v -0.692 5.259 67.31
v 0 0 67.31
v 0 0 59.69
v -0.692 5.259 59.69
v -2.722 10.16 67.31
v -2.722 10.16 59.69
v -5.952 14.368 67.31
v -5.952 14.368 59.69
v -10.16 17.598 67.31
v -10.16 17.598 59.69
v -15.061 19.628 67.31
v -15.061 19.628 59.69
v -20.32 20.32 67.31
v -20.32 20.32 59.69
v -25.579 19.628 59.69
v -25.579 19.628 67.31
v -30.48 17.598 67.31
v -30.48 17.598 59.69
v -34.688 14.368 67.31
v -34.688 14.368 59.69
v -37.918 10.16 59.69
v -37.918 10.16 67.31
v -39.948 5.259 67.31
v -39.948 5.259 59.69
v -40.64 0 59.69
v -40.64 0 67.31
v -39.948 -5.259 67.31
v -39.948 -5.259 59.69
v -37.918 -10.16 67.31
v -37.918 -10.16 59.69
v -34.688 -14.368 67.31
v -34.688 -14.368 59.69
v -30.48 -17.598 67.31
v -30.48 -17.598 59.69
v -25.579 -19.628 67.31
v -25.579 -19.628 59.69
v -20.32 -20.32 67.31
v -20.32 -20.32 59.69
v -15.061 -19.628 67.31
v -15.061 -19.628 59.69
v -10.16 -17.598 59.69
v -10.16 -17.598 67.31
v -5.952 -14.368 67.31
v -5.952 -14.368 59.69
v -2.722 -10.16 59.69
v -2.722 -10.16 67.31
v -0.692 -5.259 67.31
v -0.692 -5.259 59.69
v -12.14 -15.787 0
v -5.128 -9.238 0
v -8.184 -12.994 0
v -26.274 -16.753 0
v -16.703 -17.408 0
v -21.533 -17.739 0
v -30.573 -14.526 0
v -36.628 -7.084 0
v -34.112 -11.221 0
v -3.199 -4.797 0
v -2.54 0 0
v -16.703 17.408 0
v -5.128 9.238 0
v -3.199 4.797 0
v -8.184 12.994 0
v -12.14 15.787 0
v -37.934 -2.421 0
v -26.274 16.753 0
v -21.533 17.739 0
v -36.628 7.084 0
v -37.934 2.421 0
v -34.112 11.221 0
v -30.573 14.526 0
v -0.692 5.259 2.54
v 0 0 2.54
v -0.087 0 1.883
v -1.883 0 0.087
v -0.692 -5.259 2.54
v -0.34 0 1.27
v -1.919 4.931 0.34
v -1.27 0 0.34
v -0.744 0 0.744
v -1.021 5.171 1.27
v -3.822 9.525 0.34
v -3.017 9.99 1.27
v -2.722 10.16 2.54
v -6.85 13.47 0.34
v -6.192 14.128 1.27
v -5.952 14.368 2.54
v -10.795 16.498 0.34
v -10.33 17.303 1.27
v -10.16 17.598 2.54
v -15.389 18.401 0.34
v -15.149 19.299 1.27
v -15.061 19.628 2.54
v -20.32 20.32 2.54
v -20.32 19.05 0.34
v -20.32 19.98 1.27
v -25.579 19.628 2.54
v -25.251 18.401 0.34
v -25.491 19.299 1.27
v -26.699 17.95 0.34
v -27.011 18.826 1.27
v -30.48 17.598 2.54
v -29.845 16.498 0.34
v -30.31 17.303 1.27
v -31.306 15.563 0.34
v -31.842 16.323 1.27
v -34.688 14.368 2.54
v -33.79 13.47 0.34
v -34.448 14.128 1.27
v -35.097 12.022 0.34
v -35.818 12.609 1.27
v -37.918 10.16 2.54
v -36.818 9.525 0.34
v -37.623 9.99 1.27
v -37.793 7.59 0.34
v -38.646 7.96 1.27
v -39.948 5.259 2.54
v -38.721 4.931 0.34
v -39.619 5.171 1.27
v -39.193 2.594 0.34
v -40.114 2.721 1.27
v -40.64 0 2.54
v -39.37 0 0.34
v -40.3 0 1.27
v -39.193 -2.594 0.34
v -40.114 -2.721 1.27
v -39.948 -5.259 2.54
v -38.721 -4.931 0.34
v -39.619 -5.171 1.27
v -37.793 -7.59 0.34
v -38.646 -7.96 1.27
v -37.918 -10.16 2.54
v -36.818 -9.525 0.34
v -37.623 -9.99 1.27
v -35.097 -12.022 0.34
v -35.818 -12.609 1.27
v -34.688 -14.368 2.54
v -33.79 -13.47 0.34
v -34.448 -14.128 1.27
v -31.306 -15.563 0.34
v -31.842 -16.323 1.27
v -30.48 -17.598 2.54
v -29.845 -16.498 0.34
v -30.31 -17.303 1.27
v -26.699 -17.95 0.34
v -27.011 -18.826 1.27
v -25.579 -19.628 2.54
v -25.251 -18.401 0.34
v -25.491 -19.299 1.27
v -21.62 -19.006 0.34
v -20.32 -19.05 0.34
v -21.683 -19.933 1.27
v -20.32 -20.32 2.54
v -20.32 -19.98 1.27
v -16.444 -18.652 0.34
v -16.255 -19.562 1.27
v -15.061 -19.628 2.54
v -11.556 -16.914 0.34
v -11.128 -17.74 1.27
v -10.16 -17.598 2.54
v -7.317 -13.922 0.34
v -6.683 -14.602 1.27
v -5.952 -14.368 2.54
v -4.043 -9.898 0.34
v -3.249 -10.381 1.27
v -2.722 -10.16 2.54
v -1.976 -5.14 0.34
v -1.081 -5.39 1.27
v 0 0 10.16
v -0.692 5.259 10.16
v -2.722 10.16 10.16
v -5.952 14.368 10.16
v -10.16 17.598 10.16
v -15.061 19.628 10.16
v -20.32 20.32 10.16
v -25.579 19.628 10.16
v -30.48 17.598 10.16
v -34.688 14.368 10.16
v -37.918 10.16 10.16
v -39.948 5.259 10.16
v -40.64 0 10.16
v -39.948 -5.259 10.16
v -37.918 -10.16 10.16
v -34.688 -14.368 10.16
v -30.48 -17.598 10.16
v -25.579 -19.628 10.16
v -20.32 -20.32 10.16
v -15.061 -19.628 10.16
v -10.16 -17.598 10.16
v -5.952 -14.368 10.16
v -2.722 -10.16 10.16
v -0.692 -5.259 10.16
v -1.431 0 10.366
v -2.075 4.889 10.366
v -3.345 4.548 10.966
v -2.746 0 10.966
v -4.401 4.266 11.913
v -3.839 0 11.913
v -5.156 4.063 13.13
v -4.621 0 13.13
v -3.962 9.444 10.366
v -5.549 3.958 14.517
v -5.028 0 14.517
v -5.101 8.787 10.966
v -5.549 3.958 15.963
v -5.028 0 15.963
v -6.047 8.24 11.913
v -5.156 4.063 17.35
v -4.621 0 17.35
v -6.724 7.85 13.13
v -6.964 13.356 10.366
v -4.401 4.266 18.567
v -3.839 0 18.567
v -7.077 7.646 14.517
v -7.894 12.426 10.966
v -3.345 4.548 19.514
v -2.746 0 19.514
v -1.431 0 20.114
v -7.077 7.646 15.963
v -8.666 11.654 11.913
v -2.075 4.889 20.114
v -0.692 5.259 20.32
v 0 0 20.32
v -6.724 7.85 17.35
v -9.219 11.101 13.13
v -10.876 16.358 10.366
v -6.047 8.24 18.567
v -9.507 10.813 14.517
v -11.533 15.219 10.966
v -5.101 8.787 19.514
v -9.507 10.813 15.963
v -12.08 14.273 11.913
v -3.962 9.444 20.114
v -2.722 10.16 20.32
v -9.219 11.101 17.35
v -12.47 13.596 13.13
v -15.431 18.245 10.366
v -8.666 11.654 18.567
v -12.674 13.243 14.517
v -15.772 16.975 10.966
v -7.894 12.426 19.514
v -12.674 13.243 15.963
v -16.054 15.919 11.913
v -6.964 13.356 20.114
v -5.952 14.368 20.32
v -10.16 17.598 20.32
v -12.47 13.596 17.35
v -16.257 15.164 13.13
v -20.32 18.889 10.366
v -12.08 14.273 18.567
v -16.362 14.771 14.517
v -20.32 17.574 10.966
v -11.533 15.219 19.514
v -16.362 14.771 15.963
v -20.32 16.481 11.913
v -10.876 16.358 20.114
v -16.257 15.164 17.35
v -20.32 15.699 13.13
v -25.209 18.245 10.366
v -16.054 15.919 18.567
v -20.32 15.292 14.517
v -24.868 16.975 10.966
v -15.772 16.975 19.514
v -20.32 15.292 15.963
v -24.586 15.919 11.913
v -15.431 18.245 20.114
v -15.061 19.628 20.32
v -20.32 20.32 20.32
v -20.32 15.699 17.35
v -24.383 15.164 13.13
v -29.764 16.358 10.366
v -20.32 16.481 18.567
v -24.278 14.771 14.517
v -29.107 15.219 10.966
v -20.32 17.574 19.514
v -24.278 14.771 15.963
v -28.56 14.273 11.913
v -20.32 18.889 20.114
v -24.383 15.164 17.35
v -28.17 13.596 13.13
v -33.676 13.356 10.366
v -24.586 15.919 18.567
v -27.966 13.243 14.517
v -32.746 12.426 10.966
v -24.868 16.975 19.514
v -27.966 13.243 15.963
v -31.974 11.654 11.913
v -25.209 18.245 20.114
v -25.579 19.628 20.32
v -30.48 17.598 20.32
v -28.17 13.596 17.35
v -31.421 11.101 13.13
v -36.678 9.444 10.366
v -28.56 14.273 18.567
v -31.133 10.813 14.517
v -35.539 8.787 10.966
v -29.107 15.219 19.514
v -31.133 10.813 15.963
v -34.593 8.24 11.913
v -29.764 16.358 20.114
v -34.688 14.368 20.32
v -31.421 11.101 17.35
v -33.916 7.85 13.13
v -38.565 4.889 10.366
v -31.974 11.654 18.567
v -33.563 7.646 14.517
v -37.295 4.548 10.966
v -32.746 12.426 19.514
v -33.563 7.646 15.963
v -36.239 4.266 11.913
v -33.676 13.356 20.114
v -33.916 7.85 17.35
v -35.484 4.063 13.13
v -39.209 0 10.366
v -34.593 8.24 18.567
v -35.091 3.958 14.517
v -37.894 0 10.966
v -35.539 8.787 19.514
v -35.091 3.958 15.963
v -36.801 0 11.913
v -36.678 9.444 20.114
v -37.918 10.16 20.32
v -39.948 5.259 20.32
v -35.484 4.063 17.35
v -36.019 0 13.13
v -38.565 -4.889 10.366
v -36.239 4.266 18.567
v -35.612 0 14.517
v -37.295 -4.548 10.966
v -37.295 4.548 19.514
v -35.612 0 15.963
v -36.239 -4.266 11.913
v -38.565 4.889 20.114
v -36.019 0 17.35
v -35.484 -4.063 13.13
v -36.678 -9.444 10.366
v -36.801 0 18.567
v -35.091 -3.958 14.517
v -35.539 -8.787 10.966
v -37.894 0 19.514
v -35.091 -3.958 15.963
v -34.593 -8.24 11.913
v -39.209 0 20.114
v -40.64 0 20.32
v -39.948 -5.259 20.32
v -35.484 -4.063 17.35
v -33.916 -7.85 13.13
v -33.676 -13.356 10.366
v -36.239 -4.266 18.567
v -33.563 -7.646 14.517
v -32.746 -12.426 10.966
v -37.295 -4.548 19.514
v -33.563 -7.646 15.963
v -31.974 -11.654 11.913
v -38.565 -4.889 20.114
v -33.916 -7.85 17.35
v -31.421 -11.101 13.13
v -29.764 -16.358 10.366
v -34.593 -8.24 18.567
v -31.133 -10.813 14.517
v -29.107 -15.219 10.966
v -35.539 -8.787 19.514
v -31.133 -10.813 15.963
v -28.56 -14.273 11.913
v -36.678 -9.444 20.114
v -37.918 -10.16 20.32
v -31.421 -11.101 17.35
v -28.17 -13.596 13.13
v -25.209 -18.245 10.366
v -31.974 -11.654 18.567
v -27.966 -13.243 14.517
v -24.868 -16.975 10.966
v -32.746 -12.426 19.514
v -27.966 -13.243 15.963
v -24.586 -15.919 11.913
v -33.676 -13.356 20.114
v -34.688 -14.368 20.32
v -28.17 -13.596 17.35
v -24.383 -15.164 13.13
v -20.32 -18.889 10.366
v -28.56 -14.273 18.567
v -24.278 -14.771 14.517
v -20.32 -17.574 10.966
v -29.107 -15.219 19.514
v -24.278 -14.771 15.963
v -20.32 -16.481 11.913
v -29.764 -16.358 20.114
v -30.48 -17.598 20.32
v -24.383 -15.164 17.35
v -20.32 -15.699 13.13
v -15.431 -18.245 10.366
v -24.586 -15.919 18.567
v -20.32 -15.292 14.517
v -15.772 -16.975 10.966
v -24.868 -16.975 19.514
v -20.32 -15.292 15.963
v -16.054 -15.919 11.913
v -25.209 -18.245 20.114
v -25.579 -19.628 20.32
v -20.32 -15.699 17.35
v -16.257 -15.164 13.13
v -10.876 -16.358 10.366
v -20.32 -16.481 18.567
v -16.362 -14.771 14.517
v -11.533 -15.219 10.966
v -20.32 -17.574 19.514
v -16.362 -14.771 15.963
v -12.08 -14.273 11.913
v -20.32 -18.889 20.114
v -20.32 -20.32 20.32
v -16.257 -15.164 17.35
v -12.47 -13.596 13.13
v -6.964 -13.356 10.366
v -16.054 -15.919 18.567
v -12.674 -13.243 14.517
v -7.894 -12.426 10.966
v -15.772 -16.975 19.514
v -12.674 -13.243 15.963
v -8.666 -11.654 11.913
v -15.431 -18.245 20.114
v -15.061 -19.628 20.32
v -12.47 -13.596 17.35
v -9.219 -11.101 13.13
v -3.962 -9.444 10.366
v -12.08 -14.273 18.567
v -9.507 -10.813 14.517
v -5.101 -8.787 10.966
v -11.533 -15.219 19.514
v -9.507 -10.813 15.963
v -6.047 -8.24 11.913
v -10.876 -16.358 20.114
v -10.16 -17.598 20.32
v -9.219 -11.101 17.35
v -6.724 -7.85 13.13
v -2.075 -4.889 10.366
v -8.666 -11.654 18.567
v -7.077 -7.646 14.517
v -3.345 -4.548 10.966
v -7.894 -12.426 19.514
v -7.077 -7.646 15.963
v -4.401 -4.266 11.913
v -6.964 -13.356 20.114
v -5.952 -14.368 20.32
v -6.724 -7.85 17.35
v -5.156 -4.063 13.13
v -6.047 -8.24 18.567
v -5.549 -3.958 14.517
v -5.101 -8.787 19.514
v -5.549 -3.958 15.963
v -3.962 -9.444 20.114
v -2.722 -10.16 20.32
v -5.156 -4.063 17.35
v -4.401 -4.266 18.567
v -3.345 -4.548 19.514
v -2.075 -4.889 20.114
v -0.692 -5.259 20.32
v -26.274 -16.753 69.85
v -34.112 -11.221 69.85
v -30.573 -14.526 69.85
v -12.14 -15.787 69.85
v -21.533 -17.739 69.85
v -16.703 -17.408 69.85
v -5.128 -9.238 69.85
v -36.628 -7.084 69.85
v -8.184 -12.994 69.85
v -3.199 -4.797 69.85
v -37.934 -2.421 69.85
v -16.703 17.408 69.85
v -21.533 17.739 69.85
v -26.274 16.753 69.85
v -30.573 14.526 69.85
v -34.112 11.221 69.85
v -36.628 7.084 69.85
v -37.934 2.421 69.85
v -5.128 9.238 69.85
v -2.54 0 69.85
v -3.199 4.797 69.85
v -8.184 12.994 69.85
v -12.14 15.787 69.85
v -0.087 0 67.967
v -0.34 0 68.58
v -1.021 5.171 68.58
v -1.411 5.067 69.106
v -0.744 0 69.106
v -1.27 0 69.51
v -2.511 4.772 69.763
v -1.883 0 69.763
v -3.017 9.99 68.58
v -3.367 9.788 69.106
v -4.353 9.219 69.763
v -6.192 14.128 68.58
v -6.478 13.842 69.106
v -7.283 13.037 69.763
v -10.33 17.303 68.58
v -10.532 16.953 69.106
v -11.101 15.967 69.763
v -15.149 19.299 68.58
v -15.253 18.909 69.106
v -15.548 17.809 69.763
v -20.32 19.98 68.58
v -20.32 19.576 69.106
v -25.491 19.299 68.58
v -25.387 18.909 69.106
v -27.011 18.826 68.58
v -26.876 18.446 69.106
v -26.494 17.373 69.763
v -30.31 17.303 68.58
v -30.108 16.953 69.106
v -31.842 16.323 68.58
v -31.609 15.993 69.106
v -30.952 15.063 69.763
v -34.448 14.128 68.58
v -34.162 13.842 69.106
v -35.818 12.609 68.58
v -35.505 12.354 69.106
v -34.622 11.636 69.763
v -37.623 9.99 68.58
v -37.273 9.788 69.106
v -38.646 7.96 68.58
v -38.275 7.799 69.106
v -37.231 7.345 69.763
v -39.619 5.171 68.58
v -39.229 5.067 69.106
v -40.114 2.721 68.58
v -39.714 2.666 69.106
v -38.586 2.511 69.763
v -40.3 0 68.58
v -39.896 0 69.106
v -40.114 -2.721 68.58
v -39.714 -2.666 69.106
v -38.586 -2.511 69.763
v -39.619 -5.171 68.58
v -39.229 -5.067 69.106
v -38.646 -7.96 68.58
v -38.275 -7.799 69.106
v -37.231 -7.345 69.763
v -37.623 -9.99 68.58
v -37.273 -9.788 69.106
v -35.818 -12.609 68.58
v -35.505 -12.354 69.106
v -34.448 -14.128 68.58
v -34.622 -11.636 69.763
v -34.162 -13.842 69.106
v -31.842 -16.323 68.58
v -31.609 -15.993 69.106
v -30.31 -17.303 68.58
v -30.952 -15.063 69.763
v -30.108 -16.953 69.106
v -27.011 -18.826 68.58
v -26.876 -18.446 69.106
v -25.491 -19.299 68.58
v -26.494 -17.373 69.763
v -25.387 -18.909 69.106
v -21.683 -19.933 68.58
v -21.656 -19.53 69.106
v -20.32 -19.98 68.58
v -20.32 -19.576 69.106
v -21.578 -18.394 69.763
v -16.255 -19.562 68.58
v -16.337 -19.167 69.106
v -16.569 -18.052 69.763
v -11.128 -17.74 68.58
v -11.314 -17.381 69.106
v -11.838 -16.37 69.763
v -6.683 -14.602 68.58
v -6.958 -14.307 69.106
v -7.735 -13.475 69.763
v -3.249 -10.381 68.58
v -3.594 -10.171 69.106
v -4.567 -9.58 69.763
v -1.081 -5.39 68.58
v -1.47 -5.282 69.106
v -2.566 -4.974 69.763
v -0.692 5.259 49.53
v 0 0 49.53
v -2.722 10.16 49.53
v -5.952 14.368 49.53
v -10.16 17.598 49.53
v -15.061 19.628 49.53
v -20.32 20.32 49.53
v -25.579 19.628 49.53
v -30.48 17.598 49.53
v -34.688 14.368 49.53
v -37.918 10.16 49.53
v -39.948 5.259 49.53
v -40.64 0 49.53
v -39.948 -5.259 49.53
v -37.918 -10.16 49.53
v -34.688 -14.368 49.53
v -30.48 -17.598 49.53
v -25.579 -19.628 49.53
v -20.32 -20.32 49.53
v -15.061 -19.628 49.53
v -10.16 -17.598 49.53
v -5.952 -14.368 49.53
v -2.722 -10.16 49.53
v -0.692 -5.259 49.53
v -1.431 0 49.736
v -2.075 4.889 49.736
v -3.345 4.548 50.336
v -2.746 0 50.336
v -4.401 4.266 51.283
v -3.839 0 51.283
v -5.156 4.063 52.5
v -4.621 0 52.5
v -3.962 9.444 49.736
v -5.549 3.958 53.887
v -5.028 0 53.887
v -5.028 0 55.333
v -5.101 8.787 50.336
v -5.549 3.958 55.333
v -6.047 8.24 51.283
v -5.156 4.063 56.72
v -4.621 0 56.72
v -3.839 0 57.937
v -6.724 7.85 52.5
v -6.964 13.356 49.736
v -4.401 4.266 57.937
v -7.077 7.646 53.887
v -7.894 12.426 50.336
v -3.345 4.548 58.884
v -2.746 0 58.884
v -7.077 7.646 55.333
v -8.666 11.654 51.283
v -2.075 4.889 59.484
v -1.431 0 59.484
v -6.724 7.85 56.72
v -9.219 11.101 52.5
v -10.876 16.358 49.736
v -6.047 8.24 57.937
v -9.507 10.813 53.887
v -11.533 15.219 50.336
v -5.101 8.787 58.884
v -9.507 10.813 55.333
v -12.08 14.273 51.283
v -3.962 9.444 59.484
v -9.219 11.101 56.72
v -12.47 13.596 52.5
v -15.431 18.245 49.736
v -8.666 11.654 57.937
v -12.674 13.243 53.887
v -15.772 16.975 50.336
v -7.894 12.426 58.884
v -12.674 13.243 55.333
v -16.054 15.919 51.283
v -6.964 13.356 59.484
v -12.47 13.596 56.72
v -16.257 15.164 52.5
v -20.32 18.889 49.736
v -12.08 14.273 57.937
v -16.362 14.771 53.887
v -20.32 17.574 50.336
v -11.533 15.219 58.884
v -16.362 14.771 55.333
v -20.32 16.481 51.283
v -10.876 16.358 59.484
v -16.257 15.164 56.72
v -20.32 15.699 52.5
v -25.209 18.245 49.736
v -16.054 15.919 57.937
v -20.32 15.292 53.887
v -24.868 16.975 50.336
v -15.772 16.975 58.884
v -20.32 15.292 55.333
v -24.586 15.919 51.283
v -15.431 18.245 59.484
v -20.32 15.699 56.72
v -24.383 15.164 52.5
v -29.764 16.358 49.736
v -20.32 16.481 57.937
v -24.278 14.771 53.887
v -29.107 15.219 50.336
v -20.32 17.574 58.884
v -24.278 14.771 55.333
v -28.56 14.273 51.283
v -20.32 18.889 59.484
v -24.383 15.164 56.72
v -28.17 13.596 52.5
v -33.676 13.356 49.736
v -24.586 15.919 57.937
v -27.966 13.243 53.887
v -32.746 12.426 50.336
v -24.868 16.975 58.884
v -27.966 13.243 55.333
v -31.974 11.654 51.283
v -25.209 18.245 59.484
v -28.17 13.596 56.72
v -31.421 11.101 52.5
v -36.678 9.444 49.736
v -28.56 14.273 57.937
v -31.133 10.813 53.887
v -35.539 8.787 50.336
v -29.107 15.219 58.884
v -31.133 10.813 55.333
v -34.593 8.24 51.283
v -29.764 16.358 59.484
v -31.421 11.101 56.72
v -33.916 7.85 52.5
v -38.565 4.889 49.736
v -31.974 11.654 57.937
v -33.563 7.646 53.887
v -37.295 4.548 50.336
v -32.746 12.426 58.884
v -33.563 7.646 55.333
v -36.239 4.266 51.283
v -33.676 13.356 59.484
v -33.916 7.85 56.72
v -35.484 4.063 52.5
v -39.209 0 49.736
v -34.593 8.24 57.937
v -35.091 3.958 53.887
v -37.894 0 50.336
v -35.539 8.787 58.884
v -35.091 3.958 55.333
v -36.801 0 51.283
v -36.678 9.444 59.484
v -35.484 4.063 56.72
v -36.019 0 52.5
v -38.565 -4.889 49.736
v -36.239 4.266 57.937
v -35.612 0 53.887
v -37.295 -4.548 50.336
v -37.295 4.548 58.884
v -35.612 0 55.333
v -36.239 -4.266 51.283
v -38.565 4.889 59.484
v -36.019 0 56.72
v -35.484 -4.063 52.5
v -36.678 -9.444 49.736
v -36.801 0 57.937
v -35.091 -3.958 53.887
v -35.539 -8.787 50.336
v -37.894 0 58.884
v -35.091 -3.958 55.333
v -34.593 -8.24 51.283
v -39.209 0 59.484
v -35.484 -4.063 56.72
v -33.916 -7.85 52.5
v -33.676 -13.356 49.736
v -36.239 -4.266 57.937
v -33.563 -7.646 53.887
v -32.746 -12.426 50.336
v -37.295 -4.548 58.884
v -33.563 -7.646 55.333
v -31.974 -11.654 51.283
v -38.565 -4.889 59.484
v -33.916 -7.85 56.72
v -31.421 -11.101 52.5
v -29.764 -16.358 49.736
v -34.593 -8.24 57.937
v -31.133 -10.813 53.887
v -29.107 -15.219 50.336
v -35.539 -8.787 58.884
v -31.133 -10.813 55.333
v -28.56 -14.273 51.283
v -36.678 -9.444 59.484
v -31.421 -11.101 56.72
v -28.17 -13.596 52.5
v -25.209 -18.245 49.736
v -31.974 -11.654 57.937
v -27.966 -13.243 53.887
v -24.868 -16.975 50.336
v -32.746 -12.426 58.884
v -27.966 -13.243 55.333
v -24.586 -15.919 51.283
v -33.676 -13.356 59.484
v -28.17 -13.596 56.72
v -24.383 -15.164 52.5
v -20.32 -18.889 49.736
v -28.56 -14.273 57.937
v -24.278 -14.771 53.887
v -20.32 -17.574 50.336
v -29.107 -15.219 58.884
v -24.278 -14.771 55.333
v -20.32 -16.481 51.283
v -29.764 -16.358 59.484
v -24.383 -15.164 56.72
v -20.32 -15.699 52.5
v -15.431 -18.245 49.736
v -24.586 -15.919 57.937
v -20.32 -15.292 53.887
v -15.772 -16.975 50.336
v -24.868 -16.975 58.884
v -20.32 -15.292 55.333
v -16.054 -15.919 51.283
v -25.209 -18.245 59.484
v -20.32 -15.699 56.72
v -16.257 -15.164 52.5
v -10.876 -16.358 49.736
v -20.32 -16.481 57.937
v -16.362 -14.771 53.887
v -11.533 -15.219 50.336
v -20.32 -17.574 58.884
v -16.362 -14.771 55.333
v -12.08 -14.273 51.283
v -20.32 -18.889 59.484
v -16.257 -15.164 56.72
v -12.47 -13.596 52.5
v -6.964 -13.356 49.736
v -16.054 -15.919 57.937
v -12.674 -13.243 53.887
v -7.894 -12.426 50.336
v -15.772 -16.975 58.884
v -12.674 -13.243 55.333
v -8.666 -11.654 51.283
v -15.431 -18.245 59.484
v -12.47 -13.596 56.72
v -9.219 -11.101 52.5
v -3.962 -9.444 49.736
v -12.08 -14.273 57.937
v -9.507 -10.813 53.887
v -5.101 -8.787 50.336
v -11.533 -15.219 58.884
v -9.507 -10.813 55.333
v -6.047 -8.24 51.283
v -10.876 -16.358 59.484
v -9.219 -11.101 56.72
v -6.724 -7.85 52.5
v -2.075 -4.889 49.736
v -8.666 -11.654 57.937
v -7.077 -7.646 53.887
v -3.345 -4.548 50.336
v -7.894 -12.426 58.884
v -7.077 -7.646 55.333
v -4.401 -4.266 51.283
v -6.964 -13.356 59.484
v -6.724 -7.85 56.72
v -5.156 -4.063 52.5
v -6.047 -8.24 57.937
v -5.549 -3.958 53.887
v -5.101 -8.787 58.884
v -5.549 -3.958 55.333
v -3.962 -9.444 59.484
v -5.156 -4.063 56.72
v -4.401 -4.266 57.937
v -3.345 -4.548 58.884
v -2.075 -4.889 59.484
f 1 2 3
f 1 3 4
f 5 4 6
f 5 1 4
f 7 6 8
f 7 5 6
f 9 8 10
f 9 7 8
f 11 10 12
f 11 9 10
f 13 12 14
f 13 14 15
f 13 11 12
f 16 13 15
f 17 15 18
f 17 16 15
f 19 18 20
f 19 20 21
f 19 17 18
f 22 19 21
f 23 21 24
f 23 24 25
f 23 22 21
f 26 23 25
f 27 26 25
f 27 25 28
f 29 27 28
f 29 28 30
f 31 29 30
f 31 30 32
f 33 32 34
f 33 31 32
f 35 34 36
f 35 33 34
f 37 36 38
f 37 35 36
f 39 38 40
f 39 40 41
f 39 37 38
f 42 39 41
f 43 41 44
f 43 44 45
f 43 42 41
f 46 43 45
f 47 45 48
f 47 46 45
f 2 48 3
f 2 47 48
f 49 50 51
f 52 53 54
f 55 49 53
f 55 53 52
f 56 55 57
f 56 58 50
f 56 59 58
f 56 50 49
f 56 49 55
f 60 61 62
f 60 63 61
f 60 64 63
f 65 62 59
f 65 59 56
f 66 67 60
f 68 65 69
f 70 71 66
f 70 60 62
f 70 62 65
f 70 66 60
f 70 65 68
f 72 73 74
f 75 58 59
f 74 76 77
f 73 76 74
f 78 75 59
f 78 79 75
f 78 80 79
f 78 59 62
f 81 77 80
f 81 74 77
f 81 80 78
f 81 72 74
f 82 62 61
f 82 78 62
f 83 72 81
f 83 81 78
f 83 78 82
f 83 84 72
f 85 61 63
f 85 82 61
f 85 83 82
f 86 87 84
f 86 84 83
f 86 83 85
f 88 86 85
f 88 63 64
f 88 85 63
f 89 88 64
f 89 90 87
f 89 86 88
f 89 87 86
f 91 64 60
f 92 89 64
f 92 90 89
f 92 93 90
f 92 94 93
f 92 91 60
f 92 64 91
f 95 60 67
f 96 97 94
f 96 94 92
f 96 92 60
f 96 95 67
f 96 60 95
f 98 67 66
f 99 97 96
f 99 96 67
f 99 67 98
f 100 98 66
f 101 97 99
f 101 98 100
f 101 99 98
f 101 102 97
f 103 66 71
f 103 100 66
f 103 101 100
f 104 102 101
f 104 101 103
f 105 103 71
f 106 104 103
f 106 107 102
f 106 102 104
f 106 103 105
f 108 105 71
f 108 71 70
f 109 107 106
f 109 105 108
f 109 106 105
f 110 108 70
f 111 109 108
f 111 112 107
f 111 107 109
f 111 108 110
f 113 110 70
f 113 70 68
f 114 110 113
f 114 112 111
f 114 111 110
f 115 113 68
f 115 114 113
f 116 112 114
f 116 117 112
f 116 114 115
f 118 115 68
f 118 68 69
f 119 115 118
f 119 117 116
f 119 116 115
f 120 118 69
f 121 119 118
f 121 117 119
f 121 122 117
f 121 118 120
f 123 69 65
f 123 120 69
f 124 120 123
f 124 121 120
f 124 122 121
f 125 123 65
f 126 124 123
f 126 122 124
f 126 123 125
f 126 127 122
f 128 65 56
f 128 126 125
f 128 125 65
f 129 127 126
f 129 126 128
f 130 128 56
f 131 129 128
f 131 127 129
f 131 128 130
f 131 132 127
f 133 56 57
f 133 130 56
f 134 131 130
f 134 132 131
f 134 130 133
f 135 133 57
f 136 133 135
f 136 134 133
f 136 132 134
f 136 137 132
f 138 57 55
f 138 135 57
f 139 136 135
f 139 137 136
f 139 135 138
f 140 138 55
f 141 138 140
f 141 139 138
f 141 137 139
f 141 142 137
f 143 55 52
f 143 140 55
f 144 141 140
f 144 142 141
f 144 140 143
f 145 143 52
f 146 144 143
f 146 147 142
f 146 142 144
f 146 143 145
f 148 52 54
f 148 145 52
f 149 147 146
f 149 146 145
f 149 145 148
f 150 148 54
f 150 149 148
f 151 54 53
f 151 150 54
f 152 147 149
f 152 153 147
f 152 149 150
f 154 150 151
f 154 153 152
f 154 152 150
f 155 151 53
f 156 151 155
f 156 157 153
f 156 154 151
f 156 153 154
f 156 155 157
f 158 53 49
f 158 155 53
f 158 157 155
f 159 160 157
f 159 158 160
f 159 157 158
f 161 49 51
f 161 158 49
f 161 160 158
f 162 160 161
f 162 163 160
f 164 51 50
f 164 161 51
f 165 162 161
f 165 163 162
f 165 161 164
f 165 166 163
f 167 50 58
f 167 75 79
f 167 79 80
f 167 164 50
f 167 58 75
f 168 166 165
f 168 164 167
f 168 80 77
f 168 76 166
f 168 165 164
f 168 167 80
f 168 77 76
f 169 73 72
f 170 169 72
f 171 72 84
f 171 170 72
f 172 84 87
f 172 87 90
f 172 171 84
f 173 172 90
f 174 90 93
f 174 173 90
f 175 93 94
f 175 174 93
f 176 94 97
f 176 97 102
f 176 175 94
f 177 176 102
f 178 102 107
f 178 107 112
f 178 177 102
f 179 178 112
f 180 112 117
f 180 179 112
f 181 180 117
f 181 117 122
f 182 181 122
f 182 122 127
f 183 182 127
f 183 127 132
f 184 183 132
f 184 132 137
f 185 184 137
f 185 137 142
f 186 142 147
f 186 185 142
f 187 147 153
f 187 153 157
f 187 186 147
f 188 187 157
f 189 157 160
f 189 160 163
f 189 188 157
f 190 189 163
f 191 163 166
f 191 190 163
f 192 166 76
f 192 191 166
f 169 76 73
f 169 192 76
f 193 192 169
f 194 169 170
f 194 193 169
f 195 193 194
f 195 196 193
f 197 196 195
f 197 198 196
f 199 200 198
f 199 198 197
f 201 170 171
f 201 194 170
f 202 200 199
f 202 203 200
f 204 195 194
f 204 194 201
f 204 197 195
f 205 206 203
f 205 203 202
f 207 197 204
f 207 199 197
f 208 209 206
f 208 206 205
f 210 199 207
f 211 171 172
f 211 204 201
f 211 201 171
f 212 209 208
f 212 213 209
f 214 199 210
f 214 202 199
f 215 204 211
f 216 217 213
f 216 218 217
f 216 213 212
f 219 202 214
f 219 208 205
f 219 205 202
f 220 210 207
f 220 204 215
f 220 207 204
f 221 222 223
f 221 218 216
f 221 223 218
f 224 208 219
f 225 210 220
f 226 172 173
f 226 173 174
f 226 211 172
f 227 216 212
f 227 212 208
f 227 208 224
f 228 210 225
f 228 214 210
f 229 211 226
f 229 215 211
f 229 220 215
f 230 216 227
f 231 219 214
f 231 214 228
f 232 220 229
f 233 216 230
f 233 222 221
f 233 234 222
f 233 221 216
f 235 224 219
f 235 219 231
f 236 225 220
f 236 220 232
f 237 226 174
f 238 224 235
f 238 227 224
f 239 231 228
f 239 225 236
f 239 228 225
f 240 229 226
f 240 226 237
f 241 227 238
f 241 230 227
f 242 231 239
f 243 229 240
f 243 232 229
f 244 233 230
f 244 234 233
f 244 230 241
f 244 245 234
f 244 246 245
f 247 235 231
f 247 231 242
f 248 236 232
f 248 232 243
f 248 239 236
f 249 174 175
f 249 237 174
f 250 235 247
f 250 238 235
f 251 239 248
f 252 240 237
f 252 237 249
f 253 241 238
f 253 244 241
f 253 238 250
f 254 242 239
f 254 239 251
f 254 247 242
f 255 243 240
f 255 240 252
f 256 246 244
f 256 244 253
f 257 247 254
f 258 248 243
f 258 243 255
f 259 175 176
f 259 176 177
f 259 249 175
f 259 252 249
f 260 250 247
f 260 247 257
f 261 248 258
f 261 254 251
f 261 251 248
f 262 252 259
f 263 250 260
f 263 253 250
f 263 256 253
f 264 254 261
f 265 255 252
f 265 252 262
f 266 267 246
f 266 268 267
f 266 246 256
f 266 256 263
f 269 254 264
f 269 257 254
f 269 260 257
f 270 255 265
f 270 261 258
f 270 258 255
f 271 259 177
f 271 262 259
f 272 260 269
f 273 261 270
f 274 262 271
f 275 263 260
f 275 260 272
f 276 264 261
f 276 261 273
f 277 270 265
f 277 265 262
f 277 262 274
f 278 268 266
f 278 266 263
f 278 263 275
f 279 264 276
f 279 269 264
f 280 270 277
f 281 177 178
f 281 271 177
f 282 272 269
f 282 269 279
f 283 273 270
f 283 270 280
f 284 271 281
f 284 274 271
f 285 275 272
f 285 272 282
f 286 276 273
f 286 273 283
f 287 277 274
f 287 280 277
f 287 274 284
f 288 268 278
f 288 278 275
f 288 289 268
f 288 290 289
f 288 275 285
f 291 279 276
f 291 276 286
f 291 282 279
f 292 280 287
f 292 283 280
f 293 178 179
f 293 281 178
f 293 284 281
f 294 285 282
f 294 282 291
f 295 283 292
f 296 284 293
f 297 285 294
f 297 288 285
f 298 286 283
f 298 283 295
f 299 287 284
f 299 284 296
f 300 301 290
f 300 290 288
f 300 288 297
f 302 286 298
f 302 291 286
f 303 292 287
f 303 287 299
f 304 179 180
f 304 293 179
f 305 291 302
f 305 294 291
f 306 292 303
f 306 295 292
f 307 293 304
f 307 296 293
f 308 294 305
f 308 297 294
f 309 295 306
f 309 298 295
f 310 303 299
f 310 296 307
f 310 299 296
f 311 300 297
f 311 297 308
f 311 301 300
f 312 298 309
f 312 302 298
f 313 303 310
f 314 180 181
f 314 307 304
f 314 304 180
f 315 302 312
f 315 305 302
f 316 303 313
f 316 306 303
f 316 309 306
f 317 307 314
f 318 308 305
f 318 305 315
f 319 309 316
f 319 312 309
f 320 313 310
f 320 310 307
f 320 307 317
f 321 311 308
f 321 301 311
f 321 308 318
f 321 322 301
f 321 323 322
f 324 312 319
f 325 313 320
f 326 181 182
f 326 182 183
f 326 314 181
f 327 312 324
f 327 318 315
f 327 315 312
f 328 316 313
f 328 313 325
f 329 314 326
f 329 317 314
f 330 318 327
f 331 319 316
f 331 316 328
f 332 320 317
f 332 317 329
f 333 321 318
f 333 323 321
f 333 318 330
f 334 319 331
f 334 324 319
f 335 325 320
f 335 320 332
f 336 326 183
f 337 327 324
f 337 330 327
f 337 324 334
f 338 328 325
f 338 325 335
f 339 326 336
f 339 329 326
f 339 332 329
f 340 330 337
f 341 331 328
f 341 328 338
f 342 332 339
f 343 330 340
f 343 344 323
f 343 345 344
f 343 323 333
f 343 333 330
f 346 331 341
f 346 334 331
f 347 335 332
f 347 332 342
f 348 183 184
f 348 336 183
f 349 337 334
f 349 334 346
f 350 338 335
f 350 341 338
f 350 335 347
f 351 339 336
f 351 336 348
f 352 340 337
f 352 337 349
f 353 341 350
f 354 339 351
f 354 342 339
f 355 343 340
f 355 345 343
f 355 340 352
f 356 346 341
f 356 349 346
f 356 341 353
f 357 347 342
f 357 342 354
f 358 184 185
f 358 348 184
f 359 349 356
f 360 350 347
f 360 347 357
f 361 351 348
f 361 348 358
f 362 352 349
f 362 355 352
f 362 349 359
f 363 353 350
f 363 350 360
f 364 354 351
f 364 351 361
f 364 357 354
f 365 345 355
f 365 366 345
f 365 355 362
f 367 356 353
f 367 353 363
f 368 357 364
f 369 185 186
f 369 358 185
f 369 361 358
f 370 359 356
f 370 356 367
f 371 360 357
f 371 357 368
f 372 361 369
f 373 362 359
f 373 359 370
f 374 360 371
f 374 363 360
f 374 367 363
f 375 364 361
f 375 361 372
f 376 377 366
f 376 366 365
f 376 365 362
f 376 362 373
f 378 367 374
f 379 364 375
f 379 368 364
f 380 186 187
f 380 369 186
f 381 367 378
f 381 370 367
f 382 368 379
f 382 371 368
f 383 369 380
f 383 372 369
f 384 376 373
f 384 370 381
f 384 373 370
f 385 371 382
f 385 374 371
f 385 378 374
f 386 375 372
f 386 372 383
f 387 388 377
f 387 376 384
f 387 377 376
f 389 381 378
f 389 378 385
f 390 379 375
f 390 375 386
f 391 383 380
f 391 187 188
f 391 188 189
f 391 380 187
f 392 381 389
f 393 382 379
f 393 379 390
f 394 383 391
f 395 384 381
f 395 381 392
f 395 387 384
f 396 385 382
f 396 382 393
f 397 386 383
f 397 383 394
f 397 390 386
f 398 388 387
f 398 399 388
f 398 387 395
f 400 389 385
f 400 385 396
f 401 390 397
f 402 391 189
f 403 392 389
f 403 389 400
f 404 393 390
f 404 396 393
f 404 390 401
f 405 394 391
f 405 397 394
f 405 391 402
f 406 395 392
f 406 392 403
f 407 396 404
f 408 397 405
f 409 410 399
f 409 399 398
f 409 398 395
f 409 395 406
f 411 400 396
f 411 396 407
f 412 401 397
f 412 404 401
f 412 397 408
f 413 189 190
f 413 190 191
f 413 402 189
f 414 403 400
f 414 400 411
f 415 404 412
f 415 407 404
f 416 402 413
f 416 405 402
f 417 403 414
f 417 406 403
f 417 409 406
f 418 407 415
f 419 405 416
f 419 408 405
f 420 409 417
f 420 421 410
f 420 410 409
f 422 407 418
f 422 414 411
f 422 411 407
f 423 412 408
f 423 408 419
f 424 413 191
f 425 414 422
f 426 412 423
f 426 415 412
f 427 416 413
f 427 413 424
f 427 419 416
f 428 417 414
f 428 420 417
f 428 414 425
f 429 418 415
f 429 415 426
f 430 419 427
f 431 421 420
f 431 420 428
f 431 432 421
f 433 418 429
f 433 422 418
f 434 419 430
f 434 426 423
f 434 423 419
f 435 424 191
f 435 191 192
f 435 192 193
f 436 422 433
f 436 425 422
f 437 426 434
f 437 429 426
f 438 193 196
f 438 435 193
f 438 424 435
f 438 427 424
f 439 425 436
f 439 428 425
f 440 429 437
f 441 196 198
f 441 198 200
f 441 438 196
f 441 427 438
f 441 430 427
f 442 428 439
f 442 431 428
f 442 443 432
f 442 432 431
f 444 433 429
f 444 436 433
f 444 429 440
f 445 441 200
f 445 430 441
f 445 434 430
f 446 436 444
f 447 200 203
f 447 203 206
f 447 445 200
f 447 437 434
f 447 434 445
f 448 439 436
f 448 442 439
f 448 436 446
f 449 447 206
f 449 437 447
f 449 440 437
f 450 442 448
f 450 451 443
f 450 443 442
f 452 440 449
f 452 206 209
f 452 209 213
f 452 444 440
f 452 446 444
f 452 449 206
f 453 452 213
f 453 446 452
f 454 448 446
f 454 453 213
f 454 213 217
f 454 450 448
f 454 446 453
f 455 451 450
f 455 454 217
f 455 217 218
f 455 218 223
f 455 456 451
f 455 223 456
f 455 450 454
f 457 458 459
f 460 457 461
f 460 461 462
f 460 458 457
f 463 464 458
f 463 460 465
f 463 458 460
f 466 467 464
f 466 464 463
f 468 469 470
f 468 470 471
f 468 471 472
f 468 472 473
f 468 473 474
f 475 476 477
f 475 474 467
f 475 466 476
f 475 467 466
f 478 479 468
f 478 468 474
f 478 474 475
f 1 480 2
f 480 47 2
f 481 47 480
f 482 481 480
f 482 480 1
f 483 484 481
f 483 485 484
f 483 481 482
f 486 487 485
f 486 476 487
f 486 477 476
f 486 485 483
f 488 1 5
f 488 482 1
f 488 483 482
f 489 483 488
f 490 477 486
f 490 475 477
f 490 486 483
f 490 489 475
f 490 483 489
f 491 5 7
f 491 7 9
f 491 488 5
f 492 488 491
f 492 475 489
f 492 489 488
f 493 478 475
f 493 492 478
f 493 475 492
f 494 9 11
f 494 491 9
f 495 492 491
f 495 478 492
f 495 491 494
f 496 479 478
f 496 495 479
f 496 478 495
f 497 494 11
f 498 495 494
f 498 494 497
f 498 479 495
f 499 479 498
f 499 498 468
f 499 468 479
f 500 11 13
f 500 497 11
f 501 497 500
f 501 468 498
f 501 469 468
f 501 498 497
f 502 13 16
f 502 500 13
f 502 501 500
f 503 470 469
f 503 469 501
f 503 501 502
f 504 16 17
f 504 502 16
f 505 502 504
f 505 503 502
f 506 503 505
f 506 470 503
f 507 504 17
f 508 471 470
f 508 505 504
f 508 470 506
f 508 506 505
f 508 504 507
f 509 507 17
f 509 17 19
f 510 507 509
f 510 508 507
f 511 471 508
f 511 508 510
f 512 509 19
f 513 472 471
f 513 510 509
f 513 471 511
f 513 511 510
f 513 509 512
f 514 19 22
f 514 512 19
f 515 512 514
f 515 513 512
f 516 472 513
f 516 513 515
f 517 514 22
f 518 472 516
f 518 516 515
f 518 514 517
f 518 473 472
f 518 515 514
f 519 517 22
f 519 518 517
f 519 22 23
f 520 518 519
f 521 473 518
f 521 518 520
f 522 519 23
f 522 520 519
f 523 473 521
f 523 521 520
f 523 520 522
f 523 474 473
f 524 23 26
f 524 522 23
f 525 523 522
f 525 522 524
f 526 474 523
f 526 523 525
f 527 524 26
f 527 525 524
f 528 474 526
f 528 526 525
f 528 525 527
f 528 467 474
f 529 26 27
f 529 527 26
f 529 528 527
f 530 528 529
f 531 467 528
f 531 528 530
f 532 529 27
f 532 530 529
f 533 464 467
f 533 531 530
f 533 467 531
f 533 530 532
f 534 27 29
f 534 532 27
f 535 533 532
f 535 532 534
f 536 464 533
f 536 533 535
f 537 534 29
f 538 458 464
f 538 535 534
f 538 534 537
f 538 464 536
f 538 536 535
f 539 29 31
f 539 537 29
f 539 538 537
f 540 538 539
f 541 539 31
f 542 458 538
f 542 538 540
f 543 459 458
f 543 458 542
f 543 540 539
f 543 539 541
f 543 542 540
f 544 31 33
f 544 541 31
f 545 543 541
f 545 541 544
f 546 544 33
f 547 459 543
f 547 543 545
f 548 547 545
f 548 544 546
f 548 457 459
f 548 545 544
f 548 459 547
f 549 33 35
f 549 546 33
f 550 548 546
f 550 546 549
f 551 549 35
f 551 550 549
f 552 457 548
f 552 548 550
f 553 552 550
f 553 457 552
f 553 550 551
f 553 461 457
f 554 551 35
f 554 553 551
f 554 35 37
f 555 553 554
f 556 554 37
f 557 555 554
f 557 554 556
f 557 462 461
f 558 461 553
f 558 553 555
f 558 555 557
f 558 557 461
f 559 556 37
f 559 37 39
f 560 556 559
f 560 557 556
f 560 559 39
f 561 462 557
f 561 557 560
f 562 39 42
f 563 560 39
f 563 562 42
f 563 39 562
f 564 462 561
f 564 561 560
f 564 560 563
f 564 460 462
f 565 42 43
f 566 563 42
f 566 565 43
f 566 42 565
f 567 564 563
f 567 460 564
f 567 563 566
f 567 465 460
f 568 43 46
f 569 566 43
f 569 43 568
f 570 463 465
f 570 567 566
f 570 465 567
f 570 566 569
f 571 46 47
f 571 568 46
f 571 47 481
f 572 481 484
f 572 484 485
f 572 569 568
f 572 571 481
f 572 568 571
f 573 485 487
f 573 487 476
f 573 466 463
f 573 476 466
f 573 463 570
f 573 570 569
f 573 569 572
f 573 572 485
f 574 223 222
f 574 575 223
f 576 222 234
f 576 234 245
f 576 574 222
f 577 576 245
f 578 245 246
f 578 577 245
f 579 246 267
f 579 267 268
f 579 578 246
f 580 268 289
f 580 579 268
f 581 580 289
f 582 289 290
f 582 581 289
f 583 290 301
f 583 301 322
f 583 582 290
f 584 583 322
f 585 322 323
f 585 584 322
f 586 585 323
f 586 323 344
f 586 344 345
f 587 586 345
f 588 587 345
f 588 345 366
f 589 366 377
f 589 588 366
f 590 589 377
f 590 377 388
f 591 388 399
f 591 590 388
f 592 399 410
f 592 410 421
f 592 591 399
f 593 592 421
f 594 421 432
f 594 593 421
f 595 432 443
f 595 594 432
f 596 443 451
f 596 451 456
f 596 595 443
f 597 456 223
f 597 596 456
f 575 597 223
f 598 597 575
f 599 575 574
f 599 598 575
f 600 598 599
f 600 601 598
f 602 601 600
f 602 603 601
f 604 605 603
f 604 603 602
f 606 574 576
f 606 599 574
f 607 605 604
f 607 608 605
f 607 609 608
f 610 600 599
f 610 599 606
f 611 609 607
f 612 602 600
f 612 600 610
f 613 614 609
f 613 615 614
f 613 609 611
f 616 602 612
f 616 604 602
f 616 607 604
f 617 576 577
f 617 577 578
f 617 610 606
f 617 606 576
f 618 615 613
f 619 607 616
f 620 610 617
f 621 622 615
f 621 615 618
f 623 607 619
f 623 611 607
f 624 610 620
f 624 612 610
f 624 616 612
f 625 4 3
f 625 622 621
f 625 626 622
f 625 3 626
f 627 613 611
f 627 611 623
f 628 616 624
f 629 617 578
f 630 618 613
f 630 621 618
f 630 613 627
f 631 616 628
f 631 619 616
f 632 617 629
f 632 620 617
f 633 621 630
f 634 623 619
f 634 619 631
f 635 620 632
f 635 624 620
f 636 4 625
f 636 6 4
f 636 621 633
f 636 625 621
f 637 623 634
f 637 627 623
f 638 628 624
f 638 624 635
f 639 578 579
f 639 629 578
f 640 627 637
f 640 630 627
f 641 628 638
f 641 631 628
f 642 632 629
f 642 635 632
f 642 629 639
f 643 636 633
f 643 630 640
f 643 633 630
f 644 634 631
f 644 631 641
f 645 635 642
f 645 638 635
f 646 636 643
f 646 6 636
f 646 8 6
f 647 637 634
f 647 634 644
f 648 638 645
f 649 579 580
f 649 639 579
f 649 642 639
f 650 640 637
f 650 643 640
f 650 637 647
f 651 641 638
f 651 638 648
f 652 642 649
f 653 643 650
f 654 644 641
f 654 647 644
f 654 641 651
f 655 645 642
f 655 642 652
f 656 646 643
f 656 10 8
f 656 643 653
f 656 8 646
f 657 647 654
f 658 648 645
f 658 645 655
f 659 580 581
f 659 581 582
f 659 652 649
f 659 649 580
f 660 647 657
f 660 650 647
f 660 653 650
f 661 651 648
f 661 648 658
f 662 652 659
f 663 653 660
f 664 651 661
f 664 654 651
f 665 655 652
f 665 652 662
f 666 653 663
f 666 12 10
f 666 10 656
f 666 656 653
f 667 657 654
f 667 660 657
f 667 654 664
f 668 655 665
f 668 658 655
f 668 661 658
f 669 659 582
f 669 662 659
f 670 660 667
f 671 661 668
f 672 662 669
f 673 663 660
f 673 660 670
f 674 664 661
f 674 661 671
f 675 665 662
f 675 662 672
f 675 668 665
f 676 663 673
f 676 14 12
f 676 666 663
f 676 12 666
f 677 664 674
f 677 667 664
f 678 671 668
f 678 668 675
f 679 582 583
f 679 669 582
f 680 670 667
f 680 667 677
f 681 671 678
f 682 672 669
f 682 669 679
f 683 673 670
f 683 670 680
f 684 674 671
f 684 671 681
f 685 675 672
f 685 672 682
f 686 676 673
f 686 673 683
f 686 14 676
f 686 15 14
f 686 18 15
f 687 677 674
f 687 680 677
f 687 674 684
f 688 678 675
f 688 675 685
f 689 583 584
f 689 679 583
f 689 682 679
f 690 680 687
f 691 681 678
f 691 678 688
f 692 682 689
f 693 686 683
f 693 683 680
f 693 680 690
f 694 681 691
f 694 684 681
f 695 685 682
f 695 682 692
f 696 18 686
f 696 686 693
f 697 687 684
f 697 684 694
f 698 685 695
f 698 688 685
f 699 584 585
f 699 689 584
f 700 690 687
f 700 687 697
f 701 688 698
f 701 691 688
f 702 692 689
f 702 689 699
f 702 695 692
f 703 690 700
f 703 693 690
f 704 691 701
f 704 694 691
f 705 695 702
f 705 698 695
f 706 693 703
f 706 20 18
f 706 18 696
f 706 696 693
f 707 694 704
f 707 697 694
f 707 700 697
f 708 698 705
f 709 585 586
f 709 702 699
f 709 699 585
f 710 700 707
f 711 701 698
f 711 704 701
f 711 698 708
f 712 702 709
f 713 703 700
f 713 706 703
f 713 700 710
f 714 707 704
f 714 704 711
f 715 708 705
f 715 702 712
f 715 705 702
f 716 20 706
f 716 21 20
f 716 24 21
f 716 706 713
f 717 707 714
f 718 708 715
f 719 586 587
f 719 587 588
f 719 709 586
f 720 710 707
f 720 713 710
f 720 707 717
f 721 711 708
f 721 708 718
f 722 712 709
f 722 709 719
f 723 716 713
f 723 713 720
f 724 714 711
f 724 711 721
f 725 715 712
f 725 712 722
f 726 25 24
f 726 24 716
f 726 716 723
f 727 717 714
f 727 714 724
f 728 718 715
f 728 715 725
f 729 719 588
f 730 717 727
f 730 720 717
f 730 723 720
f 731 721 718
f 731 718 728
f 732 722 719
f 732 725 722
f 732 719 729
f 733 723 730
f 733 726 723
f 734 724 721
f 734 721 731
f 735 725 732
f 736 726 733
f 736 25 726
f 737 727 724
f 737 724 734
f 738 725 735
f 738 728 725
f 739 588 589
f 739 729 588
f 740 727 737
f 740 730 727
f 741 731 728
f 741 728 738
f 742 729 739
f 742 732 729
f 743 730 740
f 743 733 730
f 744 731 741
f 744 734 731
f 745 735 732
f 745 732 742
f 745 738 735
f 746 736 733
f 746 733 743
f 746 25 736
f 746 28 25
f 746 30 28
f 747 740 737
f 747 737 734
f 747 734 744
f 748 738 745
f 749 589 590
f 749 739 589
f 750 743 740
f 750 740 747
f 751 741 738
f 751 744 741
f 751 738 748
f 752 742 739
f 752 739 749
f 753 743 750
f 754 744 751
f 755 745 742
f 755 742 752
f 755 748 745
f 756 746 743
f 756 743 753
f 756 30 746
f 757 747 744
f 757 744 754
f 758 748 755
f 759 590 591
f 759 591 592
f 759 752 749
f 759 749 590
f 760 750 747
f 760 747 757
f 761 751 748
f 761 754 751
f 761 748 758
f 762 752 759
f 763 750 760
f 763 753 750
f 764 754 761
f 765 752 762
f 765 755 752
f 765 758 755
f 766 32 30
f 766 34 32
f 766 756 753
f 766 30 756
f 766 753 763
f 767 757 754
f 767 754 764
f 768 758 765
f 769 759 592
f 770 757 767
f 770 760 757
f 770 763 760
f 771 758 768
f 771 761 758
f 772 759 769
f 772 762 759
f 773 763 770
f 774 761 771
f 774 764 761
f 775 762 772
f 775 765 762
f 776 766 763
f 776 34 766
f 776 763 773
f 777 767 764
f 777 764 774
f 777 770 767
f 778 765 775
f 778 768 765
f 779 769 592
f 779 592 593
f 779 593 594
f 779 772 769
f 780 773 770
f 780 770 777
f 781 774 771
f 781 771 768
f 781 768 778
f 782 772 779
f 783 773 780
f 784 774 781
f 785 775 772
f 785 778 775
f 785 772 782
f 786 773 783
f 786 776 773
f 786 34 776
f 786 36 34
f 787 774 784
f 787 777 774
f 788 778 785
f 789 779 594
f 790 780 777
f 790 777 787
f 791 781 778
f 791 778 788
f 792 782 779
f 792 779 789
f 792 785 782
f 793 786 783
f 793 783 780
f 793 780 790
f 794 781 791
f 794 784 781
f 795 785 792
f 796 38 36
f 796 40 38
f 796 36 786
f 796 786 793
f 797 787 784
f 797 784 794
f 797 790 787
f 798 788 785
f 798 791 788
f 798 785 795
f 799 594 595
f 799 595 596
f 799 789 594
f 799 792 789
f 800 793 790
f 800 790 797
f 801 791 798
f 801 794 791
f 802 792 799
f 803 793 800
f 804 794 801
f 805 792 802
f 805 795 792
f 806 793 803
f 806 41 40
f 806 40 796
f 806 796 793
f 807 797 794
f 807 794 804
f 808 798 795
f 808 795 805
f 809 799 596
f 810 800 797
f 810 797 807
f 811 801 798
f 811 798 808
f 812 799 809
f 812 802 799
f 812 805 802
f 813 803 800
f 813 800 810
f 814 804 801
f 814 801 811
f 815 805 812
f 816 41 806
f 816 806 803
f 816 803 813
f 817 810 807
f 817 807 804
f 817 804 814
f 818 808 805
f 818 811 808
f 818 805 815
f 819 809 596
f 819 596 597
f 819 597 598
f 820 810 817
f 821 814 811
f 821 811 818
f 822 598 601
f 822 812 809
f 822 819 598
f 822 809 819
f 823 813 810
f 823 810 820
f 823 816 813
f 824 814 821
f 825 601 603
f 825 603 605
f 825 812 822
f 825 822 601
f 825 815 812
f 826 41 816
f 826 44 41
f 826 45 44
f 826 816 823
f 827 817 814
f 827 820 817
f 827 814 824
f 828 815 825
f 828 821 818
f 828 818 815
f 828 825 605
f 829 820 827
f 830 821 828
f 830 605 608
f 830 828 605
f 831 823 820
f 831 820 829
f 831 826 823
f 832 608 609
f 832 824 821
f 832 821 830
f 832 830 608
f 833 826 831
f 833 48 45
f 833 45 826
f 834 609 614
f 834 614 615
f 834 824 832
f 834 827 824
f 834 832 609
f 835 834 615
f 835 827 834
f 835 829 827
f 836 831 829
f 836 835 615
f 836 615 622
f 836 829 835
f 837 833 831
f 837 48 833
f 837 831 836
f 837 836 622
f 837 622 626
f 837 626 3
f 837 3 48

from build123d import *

# Parameters (mm, degrees)
F2_R = 2.54


with BuildPart() as f1:
    # F0 (on Front) → F1 (revolve)
    with BuildSketch(Plane.XZ):
        with BuildLine():
            Line((-20.32, 0), (0, 0))
            Line((0, 0), (0, 10.16))
            ThreePointArc((0, 10.16), (-5.08, 15.24), (0, 20.32))
            Line((0, 20.32), (0, 49.53))
            ThreePointArc((0, 49.53), (-5.08, 54.61), (0, 59.69))
            Line((0, 59.69), (0, 69.85))
            Line((0, 69.85), (-20.32, 69.85))
            Line((-20.32, 69.85), (-20.32, 0))
        make_face()
    revolve(axis=Axis((-20.32, 0, 34.925), (0, 0, 1)))

    # F2
    f2_edges = [f1.edges().sort_by_distance(p)[0] for p in [
        (-40.64, 0, 69.85),
        (-40.64, 0, 0),
    ]]
    fillet(f2_edges, radius=F2_R)


solid = f1.part
